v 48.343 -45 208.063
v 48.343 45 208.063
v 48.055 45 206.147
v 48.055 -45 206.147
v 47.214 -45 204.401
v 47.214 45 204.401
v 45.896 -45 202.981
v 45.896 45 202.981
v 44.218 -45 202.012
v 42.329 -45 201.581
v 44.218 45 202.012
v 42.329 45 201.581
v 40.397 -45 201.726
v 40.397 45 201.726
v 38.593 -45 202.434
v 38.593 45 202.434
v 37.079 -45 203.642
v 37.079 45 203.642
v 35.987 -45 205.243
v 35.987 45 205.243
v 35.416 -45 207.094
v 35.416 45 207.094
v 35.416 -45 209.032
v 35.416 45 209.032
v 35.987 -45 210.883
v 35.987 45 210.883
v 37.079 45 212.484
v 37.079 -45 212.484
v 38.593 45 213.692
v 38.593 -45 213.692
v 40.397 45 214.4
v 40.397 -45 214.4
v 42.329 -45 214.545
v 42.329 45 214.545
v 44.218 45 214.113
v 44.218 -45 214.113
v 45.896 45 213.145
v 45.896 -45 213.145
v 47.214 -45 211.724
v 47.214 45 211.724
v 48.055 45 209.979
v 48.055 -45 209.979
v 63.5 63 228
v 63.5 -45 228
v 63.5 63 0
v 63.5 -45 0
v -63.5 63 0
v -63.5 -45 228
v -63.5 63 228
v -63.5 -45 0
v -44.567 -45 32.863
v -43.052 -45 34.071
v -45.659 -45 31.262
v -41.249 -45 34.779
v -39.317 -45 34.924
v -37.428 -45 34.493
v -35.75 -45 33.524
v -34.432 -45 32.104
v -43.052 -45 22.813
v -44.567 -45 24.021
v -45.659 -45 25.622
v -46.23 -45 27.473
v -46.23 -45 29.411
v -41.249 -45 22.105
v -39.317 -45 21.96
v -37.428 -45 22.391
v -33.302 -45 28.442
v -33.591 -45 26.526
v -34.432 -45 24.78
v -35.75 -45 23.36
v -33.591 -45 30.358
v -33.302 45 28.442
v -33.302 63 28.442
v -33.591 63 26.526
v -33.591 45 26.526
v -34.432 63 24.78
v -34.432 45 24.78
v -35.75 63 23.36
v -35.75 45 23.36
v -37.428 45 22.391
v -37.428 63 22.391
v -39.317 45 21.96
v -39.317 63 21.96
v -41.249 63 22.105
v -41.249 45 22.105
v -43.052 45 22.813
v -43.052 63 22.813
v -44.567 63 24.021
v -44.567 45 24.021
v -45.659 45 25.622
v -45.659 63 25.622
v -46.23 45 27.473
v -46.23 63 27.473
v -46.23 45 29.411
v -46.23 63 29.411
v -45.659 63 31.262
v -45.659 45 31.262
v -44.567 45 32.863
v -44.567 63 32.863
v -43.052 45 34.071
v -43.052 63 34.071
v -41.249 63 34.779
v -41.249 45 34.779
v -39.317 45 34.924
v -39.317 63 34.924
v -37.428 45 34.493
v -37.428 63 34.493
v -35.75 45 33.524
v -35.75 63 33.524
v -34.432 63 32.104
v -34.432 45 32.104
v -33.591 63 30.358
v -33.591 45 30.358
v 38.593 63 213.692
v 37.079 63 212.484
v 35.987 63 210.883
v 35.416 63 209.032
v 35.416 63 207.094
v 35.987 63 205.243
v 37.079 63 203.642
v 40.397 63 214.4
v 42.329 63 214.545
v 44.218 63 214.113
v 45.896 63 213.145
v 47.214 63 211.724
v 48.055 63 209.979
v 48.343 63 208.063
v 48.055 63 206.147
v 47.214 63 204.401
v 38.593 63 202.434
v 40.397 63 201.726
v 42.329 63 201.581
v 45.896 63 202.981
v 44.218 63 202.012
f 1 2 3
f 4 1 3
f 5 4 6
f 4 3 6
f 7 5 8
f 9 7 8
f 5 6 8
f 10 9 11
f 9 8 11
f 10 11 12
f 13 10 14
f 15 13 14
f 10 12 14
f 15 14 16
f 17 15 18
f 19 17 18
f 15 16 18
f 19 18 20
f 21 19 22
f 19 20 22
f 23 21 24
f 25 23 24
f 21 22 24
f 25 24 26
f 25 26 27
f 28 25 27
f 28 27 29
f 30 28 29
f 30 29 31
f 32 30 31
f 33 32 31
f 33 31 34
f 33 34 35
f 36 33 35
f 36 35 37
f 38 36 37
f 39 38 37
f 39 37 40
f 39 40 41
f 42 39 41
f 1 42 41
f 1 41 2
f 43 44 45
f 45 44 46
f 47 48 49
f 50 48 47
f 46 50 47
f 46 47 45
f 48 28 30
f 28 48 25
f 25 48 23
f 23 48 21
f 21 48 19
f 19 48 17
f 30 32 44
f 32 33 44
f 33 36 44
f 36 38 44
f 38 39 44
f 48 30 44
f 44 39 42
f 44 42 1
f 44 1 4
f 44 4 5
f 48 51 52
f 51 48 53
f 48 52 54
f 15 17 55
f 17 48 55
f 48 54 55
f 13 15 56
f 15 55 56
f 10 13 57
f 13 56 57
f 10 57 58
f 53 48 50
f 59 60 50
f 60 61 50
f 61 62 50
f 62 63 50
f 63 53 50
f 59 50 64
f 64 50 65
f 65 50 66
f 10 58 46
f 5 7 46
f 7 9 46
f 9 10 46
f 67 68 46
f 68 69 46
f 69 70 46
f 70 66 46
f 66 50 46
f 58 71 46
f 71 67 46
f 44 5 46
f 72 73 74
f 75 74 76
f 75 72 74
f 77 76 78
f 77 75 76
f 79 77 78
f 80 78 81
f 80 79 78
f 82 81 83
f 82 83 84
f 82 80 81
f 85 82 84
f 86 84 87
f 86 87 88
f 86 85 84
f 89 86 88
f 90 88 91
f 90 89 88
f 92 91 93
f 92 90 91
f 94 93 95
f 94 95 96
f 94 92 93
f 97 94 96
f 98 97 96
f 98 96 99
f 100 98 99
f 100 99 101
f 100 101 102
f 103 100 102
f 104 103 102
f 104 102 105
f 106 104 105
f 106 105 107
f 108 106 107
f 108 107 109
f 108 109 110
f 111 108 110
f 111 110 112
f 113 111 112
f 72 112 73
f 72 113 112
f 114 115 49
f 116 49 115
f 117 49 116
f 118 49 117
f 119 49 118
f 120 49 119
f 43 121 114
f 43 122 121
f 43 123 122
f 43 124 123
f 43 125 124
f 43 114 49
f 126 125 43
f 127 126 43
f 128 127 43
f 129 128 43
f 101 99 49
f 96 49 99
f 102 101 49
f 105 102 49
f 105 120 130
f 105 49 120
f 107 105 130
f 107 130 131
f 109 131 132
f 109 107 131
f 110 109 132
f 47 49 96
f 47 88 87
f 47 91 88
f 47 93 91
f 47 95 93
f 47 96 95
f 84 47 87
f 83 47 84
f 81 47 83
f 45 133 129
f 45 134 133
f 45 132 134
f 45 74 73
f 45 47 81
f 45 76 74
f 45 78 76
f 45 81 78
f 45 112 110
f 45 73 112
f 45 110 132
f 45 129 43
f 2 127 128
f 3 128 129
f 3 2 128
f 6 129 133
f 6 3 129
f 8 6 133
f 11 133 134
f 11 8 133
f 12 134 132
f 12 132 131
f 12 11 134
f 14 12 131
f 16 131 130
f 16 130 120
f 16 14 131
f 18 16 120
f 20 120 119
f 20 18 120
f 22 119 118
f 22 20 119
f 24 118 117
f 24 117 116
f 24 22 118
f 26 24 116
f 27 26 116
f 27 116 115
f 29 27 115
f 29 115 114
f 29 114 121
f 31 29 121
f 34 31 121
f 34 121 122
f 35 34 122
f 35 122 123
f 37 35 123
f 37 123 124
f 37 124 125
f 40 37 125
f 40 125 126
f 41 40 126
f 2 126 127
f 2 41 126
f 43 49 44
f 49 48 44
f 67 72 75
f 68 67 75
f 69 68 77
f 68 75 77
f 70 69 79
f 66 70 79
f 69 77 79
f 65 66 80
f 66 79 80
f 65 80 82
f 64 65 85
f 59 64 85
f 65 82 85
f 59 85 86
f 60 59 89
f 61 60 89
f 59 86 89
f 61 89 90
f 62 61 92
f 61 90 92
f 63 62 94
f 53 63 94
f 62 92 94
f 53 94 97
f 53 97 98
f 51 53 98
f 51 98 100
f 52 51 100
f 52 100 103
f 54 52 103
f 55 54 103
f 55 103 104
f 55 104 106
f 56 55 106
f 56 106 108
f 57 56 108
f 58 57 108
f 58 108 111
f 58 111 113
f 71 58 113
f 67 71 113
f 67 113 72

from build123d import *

# Parameters (mm, degrees)
SKETCH1_W           = 127
SKETCH1_H           = 90
BOSS_EXTRUDE1_DEPTH = 228
SKETCH2_R           = 6.5
CUT_EXTRUDE1_DEPTH  = 228
SKETCH3_W           = 127
SKETCH3_H           = 228
SKETCH3_R           = 6.5
BOSS_EXTRUDE2_DEPTH = 18


with BuildPart() as part:
    # Sketch1 → Boss-Extrude1 (new body)
    with BuildSketch(Plane.XY):
        Rectangle(SKETCH1_W, SKETCH1_H)
    extrude(amount=BOSS_EXTRUDE1_DEPTH)

    # Sketch2 → Cut-Extrude1 (cut)
    with BuildSketch(Plane(origin=(0, 45, 0), x_dir=(1, 0, 0), z_dir=(0, 1, 0))):
        with Locations((-39.802347905, -28.441961554)):
            Circle(SKETCH2_R)
        with Locations((41.843493952, -208.06281364)):
            Circle(SKETCH2_R)
    extrude(amount=-CUT_EXTRUDE1_DEPTH, mode=Mode.SUBTRACT)

    # Sketch3 → Boss-Extrude2 (add)
    with BuildSketch(Plane(origin=(0, 45, 0), x_dir=(1, 0, 0), z_dir=(0, 1, 0))):
        with Locations((0, -114)):
            Rectangle(SKETCH3_W, SKETCH3_H)
        with Locations((-39.802347905, -28.441961554)):
            Circle(SKETCH3_R, mode=Mode.SUBTRACT)
        with Locations((41.843493952, -208.06281364)):
            Circle(SKETCH3_R, mode=Mode.SUBTRACT)
    extrude(amount=BOSS_EXTRUDE2_DEPTH)


solid = part.part
